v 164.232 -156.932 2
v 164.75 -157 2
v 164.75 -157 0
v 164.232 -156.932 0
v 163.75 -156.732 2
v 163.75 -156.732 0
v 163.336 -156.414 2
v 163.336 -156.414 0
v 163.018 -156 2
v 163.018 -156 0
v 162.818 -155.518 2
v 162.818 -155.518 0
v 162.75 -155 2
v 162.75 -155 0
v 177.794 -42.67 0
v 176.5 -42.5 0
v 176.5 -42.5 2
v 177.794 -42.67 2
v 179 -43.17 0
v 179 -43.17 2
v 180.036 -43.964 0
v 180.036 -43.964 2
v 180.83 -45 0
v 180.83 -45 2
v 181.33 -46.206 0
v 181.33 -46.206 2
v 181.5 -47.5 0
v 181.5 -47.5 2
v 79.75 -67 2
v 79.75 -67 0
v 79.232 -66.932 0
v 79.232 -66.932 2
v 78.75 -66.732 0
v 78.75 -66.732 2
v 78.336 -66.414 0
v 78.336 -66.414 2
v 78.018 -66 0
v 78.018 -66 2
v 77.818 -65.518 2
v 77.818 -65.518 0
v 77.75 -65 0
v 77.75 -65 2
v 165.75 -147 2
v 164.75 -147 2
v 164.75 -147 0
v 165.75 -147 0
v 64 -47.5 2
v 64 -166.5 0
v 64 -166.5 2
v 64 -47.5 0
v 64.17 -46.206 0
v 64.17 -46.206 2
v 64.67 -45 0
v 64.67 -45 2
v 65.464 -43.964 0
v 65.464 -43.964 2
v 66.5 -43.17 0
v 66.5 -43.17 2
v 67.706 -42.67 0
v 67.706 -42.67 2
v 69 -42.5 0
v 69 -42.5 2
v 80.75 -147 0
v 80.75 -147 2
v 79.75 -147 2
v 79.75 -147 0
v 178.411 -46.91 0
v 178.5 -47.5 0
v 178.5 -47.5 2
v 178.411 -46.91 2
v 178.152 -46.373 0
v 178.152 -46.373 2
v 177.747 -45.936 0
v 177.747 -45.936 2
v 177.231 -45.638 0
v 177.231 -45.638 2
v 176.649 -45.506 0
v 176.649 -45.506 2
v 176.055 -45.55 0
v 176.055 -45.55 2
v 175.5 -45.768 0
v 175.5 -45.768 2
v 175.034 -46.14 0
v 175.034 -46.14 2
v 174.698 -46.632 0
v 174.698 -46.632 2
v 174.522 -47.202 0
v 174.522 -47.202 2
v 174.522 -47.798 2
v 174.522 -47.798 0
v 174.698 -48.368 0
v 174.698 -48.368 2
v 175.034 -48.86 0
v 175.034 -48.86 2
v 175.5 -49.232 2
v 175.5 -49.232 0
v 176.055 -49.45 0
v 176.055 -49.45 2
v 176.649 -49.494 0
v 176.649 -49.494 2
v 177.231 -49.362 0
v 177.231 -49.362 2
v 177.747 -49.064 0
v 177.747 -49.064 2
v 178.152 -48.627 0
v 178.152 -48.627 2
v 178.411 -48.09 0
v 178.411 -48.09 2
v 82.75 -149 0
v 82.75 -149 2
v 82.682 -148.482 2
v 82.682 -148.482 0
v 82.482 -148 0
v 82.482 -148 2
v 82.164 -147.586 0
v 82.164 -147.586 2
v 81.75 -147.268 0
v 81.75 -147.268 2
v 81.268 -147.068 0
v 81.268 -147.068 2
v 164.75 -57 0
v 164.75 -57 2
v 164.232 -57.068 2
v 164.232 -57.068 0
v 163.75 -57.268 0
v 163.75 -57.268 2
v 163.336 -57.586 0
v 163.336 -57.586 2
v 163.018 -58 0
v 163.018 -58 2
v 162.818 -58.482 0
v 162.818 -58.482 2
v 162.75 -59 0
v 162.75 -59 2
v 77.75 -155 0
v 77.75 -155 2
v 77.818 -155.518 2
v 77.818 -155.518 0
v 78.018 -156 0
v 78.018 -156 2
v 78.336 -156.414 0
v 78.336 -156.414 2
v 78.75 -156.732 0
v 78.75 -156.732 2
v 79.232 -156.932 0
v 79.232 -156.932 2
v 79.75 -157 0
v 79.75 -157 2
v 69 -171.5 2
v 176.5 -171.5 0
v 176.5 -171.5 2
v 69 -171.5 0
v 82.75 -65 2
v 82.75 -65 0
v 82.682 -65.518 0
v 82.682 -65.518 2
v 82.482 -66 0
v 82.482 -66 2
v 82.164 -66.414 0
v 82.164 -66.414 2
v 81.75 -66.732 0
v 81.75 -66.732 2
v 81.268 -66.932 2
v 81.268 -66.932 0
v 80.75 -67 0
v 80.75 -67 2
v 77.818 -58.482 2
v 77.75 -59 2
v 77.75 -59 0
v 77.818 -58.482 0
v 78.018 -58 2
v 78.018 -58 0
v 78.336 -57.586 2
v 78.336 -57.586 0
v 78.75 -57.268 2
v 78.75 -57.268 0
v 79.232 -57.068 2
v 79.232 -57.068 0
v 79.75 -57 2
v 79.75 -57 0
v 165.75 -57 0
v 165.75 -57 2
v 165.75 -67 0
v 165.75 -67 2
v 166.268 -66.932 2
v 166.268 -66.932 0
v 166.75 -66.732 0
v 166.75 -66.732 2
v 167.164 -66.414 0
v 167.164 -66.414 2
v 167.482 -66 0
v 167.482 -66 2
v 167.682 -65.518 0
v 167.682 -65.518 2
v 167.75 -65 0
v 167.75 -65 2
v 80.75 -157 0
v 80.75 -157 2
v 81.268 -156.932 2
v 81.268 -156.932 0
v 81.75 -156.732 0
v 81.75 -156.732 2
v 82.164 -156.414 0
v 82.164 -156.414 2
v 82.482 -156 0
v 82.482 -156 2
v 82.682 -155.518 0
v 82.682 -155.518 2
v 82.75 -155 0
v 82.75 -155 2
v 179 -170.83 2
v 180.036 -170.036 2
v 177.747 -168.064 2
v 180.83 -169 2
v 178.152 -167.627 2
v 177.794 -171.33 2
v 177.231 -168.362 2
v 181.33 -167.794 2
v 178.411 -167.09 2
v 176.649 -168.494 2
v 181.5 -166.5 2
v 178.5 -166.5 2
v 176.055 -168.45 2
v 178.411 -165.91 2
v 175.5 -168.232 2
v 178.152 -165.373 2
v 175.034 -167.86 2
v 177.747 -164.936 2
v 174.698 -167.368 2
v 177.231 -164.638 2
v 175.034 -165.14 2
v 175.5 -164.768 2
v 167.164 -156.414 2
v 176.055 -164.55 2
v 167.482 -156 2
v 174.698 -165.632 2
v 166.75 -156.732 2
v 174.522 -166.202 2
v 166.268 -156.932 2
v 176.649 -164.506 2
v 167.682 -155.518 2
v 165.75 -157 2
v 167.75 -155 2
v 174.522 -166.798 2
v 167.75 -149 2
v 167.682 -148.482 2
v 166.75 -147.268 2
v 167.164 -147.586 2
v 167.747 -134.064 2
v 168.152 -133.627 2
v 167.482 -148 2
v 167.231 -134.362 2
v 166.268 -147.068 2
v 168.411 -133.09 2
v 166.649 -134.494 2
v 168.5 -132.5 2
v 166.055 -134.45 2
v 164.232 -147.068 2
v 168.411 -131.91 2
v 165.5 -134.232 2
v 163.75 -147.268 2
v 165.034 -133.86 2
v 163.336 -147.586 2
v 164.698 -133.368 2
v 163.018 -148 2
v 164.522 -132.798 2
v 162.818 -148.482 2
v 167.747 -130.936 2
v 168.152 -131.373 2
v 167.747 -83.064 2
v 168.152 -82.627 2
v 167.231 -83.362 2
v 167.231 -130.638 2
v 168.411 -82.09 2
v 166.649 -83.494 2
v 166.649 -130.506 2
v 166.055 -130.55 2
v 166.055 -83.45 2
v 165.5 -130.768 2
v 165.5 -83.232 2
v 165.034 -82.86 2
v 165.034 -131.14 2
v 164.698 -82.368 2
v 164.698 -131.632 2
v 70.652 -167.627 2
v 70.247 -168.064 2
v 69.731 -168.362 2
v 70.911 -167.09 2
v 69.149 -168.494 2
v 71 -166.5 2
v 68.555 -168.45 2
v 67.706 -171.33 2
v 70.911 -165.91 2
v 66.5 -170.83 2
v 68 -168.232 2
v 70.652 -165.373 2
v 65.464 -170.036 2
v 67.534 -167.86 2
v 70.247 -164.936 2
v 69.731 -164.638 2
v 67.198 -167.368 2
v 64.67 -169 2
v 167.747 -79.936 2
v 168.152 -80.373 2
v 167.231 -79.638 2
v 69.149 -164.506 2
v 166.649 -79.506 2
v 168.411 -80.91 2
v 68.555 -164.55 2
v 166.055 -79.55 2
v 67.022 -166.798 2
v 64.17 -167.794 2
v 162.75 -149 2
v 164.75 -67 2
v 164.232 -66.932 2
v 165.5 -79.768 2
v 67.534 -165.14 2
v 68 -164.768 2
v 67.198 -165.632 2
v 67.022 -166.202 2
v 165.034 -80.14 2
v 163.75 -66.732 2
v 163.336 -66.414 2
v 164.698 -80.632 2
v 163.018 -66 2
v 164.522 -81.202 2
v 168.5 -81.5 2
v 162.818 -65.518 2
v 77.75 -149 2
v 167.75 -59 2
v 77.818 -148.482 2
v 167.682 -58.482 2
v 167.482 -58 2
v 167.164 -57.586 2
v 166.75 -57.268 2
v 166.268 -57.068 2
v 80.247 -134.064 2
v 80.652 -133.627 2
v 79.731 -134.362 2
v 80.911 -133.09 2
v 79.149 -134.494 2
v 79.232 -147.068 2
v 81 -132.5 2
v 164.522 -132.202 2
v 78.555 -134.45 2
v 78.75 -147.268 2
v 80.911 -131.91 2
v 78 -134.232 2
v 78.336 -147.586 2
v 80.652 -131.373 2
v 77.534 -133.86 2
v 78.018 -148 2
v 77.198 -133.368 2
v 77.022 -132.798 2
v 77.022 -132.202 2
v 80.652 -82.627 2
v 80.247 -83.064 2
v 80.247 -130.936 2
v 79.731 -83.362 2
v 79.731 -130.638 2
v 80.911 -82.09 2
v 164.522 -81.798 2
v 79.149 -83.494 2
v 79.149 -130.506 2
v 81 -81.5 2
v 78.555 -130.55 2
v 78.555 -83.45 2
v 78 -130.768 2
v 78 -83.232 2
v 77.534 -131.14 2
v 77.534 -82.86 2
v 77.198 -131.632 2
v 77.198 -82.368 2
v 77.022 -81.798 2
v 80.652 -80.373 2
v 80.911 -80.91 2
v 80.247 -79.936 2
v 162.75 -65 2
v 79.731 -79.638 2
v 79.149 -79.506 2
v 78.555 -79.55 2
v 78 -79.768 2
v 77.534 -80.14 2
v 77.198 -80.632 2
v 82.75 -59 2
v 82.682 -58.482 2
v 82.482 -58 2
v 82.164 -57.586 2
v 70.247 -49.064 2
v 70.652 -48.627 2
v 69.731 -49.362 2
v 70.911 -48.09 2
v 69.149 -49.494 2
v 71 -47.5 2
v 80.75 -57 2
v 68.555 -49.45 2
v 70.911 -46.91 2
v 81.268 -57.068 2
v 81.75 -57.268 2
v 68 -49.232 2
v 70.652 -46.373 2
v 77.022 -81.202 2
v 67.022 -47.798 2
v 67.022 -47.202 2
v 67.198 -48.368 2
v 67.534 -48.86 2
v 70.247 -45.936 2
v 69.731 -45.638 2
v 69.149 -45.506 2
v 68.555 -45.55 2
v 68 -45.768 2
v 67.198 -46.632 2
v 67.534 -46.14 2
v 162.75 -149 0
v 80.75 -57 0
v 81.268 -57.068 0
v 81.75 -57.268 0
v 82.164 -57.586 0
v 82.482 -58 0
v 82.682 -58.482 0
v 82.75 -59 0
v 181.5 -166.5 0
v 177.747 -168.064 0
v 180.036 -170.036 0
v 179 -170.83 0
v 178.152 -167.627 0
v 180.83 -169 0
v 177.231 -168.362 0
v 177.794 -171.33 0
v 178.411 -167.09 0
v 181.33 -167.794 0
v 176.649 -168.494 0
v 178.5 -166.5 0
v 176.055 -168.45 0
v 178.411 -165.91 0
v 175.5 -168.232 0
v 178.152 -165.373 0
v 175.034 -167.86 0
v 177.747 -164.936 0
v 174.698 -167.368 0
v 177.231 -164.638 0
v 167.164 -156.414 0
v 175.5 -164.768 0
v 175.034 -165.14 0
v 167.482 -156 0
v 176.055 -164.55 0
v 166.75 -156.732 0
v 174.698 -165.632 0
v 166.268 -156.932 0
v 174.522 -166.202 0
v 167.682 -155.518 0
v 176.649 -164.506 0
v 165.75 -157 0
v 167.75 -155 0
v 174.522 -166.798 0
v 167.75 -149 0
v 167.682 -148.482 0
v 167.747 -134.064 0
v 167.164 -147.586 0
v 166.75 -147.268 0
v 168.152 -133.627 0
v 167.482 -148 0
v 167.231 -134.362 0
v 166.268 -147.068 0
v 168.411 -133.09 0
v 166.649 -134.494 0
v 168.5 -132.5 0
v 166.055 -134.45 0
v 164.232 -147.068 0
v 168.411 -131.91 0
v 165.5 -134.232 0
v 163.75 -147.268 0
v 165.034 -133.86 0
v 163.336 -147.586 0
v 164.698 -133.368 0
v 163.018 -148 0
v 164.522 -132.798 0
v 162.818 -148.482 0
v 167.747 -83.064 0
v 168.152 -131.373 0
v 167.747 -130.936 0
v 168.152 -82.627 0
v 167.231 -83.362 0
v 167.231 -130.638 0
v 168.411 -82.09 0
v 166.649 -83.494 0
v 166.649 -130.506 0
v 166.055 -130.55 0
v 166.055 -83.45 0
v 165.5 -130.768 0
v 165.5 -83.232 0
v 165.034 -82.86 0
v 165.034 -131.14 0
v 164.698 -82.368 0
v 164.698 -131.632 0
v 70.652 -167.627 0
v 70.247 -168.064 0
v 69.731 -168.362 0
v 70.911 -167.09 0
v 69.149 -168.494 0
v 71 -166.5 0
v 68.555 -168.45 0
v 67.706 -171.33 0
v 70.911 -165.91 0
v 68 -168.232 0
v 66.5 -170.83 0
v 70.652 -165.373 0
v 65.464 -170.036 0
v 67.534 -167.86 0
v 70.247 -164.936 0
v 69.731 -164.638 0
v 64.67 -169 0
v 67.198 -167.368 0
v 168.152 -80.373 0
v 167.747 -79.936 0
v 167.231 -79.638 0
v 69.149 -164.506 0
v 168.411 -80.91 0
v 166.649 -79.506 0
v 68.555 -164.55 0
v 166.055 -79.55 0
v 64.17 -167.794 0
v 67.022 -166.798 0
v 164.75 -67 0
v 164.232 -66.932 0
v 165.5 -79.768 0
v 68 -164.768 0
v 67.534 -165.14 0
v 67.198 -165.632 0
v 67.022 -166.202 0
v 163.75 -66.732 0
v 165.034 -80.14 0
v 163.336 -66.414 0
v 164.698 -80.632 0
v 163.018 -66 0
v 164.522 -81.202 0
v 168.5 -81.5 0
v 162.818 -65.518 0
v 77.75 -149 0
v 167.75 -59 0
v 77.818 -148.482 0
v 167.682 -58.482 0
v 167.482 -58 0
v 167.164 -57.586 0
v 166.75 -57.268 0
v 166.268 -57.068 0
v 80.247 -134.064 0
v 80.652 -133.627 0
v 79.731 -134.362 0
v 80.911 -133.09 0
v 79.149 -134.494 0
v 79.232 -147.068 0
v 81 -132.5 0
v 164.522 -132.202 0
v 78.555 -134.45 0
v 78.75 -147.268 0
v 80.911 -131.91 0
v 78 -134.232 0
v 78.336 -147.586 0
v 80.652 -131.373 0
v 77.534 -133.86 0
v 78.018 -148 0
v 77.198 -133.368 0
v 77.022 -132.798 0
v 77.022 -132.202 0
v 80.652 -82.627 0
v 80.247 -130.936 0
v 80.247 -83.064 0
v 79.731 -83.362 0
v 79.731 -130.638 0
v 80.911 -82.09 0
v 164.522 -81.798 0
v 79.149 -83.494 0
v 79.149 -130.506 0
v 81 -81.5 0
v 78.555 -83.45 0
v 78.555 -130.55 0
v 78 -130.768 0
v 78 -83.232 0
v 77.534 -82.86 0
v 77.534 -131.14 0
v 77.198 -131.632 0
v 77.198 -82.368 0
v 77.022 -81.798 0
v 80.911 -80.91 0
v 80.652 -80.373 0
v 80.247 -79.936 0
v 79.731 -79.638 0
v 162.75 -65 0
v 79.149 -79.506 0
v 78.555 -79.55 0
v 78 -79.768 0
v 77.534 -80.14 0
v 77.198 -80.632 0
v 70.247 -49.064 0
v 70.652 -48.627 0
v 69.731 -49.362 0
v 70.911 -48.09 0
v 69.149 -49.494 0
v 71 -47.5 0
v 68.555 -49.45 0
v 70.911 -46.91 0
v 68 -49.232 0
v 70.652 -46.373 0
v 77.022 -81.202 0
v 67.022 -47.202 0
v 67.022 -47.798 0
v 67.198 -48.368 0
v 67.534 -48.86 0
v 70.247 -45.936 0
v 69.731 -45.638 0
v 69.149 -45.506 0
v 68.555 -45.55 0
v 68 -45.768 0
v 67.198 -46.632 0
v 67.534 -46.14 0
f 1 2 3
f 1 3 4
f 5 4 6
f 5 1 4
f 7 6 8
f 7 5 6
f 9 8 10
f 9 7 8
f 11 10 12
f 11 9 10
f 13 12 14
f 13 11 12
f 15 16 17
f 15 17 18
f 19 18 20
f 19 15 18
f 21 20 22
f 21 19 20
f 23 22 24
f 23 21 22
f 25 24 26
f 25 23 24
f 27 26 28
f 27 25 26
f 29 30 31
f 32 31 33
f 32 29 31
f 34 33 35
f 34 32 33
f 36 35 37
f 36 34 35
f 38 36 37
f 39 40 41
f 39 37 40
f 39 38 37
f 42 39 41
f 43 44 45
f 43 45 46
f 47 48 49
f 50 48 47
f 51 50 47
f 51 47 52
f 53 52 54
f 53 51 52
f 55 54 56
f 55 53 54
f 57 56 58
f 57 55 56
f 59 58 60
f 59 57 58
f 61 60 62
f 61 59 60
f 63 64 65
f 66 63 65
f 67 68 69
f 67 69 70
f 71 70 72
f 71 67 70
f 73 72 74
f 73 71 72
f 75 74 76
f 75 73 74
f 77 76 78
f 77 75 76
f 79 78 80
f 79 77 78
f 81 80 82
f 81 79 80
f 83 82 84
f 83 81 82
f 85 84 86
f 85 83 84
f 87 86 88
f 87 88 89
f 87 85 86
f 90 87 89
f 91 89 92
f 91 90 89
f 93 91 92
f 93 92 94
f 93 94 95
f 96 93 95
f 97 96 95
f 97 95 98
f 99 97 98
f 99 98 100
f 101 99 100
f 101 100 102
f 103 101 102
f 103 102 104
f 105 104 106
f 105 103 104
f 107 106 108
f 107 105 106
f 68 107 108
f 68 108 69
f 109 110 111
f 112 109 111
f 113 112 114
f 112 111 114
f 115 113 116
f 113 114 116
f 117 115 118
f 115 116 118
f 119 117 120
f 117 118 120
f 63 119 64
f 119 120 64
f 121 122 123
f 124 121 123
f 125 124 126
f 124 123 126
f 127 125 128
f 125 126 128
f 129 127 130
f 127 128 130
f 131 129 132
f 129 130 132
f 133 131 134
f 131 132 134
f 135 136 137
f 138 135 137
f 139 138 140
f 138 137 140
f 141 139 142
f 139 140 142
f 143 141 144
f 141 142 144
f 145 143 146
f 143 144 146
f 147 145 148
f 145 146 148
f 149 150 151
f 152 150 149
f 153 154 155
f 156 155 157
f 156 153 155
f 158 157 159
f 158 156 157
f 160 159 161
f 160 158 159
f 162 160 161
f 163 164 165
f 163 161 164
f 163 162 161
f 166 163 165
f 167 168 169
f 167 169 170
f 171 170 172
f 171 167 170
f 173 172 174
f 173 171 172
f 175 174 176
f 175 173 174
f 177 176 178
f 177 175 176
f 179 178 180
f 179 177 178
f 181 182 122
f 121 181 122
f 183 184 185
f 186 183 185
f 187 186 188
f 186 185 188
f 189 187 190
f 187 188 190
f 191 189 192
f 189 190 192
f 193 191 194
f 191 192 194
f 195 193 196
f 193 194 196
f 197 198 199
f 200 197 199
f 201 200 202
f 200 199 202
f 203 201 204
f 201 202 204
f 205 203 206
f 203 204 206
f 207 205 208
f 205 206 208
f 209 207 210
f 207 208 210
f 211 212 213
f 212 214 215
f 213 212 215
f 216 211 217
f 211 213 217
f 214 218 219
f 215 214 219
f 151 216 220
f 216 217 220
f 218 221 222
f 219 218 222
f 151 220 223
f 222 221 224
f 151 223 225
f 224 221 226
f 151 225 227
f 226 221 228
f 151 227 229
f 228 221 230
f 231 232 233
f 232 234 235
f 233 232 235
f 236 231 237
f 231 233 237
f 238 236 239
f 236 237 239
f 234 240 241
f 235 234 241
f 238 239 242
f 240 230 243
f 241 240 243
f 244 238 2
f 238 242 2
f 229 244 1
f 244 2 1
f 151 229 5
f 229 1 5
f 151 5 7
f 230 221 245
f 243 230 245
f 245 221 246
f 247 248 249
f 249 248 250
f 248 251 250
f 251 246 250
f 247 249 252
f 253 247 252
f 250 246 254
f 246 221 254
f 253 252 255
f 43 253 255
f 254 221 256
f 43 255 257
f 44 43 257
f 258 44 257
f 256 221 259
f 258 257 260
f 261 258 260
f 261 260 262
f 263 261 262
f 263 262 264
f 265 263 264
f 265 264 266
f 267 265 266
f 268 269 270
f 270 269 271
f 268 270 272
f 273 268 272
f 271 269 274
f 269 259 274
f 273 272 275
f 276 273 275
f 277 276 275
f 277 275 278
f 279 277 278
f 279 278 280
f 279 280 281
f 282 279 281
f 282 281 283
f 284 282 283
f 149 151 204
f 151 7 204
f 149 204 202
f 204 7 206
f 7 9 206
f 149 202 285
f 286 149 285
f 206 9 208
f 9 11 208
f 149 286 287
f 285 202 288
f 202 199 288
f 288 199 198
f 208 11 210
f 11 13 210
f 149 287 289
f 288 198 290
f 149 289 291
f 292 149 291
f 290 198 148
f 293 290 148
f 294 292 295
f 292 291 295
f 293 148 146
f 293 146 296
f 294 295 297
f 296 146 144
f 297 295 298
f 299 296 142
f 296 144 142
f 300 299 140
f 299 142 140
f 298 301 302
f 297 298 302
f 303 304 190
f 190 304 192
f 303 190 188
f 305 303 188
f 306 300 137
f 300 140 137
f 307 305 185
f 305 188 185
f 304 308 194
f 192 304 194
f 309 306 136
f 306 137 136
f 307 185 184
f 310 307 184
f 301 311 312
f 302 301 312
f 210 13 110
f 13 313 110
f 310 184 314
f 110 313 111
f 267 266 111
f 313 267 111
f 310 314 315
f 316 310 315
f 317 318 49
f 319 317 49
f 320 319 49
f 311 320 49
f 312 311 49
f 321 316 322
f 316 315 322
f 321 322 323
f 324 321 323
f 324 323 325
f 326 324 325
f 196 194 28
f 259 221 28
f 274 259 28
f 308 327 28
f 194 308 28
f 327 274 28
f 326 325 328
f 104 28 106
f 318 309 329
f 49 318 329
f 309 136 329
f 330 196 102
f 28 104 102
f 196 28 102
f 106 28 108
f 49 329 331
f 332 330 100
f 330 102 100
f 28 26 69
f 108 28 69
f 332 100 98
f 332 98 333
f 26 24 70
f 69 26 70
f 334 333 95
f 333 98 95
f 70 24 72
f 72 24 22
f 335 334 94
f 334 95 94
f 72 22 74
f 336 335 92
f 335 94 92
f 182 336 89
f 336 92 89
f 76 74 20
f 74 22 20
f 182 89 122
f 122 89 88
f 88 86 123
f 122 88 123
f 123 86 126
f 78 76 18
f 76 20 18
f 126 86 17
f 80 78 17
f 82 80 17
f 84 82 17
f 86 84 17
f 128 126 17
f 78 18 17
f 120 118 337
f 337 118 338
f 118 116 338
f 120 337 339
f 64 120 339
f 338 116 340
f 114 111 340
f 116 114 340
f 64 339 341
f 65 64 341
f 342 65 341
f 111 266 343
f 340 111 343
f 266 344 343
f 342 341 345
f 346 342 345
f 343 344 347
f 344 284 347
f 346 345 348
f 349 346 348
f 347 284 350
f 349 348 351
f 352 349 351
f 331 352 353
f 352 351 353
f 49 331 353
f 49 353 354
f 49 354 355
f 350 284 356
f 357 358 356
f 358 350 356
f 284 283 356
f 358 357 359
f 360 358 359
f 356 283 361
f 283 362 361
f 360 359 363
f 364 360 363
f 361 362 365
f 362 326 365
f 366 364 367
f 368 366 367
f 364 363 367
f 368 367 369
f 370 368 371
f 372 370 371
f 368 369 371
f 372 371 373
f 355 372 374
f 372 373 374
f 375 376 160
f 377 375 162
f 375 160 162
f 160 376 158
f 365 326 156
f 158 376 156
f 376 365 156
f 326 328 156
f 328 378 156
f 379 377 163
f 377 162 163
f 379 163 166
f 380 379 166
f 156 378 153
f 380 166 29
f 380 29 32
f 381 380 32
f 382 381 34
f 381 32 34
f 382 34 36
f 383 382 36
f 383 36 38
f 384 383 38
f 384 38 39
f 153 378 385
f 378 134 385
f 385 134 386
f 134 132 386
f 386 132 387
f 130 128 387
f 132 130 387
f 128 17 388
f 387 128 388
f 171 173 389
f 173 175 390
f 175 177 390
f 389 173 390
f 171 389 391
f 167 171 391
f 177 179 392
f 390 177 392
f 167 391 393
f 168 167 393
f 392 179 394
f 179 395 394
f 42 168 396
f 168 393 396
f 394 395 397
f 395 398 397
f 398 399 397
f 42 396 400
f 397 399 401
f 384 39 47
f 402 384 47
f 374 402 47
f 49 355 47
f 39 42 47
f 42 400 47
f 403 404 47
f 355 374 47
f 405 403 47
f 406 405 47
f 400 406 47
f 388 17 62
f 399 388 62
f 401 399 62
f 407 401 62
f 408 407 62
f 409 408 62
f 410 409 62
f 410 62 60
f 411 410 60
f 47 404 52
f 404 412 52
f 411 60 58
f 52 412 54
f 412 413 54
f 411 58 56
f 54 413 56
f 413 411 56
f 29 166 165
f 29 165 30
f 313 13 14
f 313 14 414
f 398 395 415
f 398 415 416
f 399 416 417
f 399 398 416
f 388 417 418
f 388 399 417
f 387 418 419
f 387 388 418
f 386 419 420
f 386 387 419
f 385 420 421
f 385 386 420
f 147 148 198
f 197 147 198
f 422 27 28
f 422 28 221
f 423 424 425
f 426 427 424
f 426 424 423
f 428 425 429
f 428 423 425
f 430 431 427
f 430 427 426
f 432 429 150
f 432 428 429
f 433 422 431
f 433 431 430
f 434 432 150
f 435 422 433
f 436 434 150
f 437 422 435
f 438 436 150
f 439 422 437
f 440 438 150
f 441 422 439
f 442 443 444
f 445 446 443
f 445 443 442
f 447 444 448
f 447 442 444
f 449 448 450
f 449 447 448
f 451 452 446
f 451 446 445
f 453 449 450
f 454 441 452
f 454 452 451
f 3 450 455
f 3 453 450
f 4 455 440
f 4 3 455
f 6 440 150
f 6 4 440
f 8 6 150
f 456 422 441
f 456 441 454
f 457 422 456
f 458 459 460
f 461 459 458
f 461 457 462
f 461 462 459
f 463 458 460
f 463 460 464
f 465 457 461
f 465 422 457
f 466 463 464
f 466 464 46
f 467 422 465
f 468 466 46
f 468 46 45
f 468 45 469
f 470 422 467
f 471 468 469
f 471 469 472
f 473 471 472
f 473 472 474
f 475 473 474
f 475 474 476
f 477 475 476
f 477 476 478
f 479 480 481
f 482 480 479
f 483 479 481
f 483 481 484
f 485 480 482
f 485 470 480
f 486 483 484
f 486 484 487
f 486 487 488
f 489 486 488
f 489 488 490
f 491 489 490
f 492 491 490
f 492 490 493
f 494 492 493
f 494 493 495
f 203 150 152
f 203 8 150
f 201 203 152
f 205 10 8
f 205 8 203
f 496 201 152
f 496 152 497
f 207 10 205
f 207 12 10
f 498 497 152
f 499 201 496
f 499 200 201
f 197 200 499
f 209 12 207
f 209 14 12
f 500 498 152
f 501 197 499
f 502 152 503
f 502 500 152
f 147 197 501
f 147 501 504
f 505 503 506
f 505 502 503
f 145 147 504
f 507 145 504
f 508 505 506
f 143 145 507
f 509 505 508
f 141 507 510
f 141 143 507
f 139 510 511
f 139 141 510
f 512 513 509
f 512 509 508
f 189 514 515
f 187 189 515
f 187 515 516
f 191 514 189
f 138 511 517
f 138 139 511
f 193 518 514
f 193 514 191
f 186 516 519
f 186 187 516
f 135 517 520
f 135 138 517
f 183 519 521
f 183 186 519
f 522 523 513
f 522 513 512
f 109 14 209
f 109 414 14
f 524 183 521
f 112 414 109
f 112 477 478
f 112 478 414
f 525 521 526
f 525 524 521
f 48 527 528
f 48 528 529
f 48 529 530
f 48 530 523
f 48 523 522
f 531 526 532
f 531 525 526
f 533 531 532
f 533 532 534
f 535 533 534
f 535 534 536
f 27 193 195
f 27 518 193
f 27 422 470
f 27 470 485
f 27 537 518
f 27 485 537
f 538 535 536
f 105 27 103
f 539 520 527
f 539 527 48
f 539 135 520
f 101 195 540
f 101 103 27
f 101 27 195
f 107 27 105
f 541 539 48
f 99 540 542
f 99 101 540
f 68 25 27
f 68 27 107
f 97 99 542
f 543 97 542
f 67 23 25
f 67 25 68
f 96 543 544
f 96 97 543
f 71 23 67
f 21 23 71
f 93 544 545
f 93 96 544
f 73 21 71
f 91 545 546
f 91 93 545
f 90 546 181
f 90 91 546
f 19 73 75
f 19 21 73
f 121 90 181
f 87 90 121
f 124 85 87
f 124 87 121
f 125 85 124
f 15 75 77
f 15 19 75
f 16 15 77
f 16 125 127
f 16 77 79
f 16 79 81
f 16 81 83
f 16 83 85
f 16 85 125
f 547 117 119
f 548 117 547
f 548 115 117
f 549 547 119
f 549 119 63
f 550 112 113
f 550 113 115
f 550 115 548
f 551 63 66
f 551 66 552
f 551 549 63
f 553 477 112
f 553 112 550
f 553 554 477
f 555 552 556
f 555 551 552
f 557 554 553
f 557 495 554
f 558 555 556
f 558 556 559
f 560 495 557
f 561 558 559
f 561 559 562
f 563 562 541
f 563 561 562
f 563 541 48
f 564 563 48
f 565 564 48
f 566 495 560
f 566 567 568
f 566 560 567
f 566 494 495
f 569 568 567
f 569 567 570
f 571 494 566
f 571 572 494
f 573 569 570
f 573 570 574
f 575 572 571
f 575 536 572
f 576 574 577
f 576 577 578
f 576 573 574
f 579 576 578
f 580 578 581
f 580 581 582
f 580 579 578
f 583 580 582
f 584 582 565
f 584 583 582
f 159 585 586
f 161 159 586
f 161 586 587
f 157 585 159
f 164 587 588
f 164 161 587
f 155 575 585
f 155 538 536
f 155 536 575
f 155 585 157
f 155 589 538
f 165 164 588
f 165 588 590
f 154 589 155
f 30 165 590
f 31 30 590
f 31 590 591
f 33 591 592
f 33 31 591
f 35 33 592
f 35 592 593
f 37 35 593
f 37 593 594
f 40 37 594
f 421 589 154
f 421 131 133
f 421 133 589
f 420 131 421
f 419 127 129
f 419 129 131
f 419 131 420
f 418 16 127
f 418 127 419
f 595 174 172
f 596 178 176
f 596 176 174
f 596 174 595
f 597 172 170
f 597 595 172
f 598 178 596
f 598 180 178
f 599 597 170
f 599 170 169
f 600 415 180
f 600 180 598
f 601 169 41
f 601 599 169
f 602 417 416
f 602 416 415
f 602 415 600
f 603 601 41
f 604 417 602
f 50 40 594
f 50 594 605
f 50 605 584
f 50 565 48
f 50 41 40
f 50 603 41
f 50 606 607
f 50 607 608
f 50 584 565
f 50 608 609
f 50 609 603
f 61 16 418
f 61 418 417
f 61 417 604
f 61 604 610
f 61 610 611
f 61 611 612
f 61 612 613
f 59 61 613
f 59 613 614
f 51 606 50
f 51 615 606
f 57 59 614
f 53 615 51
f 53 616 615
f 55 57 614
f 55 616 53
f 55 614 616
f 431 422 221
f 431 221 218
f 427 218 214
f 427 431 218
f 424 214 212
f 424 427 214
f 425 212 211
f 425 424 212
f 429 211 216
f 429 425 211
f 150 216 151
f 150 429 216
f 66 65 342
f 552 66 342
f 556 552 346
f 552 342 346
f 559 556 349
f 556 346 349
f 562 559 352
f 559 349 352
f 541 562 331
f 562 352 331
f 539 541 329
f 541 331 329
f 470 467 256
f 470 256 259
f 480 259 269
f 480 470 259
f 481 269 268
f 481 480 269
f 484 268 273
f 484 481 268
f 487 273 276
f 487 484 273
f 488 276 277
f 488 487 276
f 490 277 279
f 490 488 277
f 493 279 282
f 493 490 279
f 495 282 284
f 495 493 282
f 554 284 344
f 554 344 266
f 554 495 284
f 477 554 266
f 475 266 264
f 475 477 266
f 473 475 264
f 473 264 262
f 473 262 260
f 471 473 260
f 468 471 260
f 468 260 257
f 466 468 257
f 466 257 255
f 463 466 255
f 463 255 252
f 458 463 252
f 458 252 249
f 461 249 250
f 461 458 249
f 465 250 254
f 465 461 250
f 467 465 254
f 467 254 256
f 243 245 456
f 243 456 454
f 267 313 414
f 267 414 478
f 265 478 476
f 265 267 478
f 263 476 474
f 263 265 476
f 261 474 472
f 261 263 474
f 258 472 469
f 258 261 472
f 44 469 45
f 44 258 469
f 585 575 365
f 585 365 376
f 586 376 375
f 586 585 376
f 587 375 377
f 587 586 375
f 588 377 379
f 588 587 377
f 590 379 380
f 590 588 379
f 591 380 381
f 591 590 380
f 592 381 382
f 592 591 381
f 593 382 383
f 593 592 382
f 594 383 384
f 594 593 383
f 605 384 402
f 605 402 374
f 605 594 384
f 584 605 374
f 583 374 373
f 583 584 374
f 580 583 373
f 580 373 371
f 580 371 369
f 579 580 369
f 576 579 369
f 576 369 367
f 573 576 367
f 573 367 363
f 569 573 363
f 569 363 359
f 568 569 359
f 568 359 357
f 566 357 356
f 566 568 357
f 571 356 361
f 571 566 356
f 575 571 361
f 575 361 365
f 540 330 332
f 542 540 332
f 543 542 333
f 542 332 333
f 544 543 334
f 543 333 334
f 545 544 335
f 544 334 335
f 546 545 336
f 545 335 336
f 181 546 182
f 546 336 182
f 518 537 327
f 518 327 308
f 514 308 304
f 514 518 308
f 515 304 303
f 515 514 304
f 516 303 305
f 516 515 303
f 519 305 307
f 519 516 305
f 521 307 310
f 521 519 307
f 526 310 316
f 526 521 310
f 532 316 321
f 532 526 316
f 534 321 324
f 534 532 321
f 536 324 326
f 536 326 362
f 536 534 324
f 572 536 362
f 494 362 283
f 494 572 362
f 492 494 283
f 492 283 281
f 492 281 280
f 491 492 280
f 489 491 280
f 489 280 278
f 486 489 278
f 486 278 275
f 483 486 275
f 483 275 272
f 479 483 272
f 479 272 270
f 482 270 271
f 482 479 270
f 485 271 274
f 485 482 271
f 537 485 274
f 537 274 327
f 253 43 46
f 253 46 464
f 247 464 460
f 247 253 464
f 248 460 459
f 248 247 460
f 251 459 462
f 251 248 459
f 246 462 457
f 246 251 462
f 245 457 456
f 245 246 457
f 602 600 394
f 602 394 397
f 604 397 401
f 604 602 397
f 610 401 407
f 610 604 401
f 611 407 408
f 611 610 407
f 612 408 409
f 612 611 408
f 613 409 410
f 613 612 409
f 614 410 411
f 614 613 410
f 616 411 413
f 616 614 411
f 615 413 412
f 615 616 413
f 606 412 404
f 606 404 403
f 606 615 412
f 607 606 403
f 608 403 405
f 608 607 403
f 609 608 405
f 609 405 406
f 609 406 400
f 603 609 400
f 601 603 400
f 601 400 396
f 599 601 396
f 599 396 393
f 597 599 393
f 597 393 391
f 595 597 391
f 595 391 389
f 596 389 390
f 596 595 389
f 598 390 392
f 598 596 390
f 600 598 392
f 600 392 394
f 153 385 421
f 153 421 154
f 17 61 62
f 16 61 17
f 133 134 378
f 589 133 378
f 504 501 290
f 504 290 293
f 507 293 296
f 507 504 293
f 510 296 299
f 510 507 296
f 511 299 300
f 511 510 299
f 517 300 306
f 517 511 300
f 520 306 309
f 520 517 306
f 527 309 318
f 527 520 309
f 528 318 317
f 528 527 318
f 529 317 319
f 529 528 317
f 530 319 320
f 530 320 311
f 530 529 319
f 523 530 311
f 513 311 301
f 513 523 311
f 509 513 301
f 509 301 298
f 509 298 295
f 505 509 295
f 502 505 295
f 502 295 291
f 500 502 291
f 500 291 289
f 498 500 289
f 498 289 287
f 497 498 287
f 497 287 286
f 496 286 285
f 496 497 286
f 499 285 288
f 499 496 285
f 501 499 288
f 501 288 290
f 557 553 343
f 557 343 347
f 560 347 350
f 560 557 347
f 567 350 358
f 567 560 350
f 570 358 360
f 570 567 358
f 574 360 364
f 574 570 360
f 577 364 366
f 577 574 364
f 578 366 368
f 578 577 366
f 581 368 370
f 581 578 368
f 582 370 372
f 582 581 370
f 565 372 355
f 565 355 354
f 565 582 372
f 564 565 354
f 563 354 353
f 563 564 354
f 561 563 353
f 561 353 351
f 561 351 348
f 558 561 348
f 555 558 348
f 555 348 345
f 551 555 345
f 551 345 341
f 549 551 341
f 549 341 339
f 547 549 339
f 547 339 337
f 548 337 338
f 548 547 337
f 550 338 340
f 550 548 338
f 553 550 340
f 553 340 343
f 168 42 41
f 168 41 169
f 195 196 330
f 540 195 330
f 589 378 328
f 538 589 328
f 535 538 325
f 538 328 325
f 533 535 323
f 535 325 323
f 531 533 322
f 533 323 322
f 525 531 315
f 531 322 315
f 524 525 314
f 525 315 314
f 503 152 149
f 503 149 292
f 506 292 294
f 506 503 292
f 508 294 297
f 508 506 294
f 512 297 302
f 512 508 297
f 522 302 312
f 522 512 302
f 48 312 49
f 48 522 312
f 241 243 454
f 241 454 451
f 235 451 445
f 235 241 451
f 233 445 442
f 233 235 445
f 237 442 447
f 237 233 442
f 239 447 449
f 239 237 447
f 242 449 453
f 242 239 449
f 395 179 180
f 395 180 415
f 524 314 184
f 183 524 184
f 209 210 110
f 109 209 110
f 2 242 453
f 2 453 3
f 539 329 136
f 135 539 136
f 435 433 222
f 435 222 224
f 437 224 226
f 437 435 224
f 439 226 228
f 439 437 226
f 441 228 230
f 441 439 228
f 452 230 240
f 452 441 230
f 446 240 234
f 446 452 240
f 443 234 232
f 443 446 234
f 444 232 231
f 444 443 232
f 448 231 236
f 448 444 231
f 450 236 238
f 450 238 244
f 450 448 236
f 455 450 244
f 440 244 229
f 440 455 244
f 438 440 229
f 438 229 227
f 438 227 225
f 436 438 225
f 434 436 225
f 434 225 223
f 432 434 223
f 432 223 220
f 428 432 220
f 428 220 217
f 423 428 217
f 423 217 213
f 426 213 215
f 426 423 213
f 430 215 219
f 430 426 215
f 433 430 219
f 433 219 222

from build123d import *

# Parameters (mm, degrees)
SKETCH1_R           = 2
BOSS_EXTRUDE1_DEPTH = 2
CUT_EXTRUDE1_DEPTH  = 3


with BuildPart() as part:
    # Sketch1 → Boss-Extrude1 (new body)
    with BuildSketch(Plane.XY):
        with BuildLine():
            Line((69, -42.5), (176.5, -42.5))
            ThreePointArc((176.5, -42.5), (180.035533906, -43.964466094), (181.5, -47.5))
            Line((181.5, -47.5), (181.5, -166.5))
            ThreePointArc((181.5, -166.5), (180.035533906, -170.035533906), (176.5, -171.5))
            Line((176.5, -171.5), (69, -171.5))
            ThreePointArc((69, -171.5), (65.464466094, -170.035533906), (64, -166.5))
            Line((64, -166.5), (64, -47.5))
            ThreePointArc((64, -47.5), (65.464466094, -43.964466094), (69, -42.5))
        make_face()
        with Locations((166.5, -81.5)):
            Circle(SKETCH1_R, mode=Mode.SUBTRACT)
        with Locations((166.5, -132.5)):
            Circle(SKETCH1_R, mode=Mode.SUBTRACT)
        with Locations((79, -132.5)):
            Circle(SKETCH1_R, mode=Mode.SUBTRACT)
        with Locations((79, -81.5)):
            Circle(SKETCH1_R, mode=Mode.SUBTRACT)
        with Locations((69, -166.5)):
            Circle(SKETCH1_R, mode=Mode.SUBTRACT)
        with Locations((176.5, -166.5)):
            Circle(SKETCH1_R, mode=Mode.SUBTRACT)
        with Locations((176.5, -47.5)):
            Circle(SKETCH1_R, mode=Mode.SUBTRACT)
        with Locations((69, -47.5)):
            Circle(SKETCH1_R, mode=Mode.SUBTRACT)
    extrude(amount=BOSS_EXTRUDE1_DEPTH)

    # Sketch2 → Cut-Extrude1 (cut)
    with BuildSketch(Plane.XY.offset(2)):
        with BuildLine():
            Line((79.75, -57), (80.75, -57))
            ThreePointArc((80.75, -57), (82.164213562, -57.585786438), (82.75, -59))
            Line((82.75, -59), (82.75, -65))
            ThreePointArc((82.75, -65), (82.164213562, -66.414213562), (80.75, -67))
            Line((80.75, -67), (79.75, -67))
            ThreePointArc((79.75, -67), (78.335786438, -66.414213562), (77.75, -65))
            Line((77.75, -65), (77.75, -59))
            ThreePointArc((77.75, -59), (78.335786438, -57.585786438), (79.75, -57))
        make_face()
        with BuildLine():
            Line((162.75, -59), (162.75, -65))
            ThreePointArc((162.75, -65), (163.335786438, -66.414213562), (164.75, -67))
            Line((164.75, -67), (165.75, -67))
            ThreePointArc((165.75, -67), (167.164213562, -66.414213562), (167.75, -65))
            Line((167.75, -65), (167.75, -59))
            ThreePointArc((167.75, -59), (167.164213562, -57.585786438), (165.75, -57))
            Line((165.75, -57), (164.75, -57))
            ThreePointArc((164.75, -57), (163.335786438, -57.585786438), (162.75, -59))
        make_face()
        with BuildLine():
            Line((165.75, -157), (164.75, -157))
            ThreePointArc((164.75, -157), (163.335786438, -156.414213562), (162.75, -155))
            Line((162.75, -155), (162.75, -149))
            ThreePointArc((162.75, -149), (163.335786438, -147.585786438), (164.75, -147))
            Line((164.75, -147), (165.75, -147))
            ThreePointArc((165.75, -147), (167.164213562, -147.585786438), (167.75, -149))
            Line((167.75, -149), (167.75, -155))
            ThreePointArc((167.75, -155), (167.164213562, -156.414213562), (165.75, -157))
        make_face()
        with BuildLine():
            Line((82.75, -155), (82.75, -149))
            ThreePointArc((82.75, -149), (82.164213562, -147.585786438), (80.75, -147))
            Line((80.75, -147), (79.75, -147))
            ThreePointArc((79.75, -147), (78.335786438, -147.585786438), (77.75, -149))
            Line((77.75, -149), (77.75, -155))
            ThreePointArc((77.75, -155), (78.335786438, -156.414213562), (79.75, -157))
            Line((79.75, -157), (80.75, -157))
            ThreePointArc((80.75, -157), (82.164213562, -156.414213562), (82.75, -155))
        make_face()
    extrude(amount=-CUT_EXTRUDE1_DEPTH, mode=Mode.SUBTRACT)


solid = part.part
